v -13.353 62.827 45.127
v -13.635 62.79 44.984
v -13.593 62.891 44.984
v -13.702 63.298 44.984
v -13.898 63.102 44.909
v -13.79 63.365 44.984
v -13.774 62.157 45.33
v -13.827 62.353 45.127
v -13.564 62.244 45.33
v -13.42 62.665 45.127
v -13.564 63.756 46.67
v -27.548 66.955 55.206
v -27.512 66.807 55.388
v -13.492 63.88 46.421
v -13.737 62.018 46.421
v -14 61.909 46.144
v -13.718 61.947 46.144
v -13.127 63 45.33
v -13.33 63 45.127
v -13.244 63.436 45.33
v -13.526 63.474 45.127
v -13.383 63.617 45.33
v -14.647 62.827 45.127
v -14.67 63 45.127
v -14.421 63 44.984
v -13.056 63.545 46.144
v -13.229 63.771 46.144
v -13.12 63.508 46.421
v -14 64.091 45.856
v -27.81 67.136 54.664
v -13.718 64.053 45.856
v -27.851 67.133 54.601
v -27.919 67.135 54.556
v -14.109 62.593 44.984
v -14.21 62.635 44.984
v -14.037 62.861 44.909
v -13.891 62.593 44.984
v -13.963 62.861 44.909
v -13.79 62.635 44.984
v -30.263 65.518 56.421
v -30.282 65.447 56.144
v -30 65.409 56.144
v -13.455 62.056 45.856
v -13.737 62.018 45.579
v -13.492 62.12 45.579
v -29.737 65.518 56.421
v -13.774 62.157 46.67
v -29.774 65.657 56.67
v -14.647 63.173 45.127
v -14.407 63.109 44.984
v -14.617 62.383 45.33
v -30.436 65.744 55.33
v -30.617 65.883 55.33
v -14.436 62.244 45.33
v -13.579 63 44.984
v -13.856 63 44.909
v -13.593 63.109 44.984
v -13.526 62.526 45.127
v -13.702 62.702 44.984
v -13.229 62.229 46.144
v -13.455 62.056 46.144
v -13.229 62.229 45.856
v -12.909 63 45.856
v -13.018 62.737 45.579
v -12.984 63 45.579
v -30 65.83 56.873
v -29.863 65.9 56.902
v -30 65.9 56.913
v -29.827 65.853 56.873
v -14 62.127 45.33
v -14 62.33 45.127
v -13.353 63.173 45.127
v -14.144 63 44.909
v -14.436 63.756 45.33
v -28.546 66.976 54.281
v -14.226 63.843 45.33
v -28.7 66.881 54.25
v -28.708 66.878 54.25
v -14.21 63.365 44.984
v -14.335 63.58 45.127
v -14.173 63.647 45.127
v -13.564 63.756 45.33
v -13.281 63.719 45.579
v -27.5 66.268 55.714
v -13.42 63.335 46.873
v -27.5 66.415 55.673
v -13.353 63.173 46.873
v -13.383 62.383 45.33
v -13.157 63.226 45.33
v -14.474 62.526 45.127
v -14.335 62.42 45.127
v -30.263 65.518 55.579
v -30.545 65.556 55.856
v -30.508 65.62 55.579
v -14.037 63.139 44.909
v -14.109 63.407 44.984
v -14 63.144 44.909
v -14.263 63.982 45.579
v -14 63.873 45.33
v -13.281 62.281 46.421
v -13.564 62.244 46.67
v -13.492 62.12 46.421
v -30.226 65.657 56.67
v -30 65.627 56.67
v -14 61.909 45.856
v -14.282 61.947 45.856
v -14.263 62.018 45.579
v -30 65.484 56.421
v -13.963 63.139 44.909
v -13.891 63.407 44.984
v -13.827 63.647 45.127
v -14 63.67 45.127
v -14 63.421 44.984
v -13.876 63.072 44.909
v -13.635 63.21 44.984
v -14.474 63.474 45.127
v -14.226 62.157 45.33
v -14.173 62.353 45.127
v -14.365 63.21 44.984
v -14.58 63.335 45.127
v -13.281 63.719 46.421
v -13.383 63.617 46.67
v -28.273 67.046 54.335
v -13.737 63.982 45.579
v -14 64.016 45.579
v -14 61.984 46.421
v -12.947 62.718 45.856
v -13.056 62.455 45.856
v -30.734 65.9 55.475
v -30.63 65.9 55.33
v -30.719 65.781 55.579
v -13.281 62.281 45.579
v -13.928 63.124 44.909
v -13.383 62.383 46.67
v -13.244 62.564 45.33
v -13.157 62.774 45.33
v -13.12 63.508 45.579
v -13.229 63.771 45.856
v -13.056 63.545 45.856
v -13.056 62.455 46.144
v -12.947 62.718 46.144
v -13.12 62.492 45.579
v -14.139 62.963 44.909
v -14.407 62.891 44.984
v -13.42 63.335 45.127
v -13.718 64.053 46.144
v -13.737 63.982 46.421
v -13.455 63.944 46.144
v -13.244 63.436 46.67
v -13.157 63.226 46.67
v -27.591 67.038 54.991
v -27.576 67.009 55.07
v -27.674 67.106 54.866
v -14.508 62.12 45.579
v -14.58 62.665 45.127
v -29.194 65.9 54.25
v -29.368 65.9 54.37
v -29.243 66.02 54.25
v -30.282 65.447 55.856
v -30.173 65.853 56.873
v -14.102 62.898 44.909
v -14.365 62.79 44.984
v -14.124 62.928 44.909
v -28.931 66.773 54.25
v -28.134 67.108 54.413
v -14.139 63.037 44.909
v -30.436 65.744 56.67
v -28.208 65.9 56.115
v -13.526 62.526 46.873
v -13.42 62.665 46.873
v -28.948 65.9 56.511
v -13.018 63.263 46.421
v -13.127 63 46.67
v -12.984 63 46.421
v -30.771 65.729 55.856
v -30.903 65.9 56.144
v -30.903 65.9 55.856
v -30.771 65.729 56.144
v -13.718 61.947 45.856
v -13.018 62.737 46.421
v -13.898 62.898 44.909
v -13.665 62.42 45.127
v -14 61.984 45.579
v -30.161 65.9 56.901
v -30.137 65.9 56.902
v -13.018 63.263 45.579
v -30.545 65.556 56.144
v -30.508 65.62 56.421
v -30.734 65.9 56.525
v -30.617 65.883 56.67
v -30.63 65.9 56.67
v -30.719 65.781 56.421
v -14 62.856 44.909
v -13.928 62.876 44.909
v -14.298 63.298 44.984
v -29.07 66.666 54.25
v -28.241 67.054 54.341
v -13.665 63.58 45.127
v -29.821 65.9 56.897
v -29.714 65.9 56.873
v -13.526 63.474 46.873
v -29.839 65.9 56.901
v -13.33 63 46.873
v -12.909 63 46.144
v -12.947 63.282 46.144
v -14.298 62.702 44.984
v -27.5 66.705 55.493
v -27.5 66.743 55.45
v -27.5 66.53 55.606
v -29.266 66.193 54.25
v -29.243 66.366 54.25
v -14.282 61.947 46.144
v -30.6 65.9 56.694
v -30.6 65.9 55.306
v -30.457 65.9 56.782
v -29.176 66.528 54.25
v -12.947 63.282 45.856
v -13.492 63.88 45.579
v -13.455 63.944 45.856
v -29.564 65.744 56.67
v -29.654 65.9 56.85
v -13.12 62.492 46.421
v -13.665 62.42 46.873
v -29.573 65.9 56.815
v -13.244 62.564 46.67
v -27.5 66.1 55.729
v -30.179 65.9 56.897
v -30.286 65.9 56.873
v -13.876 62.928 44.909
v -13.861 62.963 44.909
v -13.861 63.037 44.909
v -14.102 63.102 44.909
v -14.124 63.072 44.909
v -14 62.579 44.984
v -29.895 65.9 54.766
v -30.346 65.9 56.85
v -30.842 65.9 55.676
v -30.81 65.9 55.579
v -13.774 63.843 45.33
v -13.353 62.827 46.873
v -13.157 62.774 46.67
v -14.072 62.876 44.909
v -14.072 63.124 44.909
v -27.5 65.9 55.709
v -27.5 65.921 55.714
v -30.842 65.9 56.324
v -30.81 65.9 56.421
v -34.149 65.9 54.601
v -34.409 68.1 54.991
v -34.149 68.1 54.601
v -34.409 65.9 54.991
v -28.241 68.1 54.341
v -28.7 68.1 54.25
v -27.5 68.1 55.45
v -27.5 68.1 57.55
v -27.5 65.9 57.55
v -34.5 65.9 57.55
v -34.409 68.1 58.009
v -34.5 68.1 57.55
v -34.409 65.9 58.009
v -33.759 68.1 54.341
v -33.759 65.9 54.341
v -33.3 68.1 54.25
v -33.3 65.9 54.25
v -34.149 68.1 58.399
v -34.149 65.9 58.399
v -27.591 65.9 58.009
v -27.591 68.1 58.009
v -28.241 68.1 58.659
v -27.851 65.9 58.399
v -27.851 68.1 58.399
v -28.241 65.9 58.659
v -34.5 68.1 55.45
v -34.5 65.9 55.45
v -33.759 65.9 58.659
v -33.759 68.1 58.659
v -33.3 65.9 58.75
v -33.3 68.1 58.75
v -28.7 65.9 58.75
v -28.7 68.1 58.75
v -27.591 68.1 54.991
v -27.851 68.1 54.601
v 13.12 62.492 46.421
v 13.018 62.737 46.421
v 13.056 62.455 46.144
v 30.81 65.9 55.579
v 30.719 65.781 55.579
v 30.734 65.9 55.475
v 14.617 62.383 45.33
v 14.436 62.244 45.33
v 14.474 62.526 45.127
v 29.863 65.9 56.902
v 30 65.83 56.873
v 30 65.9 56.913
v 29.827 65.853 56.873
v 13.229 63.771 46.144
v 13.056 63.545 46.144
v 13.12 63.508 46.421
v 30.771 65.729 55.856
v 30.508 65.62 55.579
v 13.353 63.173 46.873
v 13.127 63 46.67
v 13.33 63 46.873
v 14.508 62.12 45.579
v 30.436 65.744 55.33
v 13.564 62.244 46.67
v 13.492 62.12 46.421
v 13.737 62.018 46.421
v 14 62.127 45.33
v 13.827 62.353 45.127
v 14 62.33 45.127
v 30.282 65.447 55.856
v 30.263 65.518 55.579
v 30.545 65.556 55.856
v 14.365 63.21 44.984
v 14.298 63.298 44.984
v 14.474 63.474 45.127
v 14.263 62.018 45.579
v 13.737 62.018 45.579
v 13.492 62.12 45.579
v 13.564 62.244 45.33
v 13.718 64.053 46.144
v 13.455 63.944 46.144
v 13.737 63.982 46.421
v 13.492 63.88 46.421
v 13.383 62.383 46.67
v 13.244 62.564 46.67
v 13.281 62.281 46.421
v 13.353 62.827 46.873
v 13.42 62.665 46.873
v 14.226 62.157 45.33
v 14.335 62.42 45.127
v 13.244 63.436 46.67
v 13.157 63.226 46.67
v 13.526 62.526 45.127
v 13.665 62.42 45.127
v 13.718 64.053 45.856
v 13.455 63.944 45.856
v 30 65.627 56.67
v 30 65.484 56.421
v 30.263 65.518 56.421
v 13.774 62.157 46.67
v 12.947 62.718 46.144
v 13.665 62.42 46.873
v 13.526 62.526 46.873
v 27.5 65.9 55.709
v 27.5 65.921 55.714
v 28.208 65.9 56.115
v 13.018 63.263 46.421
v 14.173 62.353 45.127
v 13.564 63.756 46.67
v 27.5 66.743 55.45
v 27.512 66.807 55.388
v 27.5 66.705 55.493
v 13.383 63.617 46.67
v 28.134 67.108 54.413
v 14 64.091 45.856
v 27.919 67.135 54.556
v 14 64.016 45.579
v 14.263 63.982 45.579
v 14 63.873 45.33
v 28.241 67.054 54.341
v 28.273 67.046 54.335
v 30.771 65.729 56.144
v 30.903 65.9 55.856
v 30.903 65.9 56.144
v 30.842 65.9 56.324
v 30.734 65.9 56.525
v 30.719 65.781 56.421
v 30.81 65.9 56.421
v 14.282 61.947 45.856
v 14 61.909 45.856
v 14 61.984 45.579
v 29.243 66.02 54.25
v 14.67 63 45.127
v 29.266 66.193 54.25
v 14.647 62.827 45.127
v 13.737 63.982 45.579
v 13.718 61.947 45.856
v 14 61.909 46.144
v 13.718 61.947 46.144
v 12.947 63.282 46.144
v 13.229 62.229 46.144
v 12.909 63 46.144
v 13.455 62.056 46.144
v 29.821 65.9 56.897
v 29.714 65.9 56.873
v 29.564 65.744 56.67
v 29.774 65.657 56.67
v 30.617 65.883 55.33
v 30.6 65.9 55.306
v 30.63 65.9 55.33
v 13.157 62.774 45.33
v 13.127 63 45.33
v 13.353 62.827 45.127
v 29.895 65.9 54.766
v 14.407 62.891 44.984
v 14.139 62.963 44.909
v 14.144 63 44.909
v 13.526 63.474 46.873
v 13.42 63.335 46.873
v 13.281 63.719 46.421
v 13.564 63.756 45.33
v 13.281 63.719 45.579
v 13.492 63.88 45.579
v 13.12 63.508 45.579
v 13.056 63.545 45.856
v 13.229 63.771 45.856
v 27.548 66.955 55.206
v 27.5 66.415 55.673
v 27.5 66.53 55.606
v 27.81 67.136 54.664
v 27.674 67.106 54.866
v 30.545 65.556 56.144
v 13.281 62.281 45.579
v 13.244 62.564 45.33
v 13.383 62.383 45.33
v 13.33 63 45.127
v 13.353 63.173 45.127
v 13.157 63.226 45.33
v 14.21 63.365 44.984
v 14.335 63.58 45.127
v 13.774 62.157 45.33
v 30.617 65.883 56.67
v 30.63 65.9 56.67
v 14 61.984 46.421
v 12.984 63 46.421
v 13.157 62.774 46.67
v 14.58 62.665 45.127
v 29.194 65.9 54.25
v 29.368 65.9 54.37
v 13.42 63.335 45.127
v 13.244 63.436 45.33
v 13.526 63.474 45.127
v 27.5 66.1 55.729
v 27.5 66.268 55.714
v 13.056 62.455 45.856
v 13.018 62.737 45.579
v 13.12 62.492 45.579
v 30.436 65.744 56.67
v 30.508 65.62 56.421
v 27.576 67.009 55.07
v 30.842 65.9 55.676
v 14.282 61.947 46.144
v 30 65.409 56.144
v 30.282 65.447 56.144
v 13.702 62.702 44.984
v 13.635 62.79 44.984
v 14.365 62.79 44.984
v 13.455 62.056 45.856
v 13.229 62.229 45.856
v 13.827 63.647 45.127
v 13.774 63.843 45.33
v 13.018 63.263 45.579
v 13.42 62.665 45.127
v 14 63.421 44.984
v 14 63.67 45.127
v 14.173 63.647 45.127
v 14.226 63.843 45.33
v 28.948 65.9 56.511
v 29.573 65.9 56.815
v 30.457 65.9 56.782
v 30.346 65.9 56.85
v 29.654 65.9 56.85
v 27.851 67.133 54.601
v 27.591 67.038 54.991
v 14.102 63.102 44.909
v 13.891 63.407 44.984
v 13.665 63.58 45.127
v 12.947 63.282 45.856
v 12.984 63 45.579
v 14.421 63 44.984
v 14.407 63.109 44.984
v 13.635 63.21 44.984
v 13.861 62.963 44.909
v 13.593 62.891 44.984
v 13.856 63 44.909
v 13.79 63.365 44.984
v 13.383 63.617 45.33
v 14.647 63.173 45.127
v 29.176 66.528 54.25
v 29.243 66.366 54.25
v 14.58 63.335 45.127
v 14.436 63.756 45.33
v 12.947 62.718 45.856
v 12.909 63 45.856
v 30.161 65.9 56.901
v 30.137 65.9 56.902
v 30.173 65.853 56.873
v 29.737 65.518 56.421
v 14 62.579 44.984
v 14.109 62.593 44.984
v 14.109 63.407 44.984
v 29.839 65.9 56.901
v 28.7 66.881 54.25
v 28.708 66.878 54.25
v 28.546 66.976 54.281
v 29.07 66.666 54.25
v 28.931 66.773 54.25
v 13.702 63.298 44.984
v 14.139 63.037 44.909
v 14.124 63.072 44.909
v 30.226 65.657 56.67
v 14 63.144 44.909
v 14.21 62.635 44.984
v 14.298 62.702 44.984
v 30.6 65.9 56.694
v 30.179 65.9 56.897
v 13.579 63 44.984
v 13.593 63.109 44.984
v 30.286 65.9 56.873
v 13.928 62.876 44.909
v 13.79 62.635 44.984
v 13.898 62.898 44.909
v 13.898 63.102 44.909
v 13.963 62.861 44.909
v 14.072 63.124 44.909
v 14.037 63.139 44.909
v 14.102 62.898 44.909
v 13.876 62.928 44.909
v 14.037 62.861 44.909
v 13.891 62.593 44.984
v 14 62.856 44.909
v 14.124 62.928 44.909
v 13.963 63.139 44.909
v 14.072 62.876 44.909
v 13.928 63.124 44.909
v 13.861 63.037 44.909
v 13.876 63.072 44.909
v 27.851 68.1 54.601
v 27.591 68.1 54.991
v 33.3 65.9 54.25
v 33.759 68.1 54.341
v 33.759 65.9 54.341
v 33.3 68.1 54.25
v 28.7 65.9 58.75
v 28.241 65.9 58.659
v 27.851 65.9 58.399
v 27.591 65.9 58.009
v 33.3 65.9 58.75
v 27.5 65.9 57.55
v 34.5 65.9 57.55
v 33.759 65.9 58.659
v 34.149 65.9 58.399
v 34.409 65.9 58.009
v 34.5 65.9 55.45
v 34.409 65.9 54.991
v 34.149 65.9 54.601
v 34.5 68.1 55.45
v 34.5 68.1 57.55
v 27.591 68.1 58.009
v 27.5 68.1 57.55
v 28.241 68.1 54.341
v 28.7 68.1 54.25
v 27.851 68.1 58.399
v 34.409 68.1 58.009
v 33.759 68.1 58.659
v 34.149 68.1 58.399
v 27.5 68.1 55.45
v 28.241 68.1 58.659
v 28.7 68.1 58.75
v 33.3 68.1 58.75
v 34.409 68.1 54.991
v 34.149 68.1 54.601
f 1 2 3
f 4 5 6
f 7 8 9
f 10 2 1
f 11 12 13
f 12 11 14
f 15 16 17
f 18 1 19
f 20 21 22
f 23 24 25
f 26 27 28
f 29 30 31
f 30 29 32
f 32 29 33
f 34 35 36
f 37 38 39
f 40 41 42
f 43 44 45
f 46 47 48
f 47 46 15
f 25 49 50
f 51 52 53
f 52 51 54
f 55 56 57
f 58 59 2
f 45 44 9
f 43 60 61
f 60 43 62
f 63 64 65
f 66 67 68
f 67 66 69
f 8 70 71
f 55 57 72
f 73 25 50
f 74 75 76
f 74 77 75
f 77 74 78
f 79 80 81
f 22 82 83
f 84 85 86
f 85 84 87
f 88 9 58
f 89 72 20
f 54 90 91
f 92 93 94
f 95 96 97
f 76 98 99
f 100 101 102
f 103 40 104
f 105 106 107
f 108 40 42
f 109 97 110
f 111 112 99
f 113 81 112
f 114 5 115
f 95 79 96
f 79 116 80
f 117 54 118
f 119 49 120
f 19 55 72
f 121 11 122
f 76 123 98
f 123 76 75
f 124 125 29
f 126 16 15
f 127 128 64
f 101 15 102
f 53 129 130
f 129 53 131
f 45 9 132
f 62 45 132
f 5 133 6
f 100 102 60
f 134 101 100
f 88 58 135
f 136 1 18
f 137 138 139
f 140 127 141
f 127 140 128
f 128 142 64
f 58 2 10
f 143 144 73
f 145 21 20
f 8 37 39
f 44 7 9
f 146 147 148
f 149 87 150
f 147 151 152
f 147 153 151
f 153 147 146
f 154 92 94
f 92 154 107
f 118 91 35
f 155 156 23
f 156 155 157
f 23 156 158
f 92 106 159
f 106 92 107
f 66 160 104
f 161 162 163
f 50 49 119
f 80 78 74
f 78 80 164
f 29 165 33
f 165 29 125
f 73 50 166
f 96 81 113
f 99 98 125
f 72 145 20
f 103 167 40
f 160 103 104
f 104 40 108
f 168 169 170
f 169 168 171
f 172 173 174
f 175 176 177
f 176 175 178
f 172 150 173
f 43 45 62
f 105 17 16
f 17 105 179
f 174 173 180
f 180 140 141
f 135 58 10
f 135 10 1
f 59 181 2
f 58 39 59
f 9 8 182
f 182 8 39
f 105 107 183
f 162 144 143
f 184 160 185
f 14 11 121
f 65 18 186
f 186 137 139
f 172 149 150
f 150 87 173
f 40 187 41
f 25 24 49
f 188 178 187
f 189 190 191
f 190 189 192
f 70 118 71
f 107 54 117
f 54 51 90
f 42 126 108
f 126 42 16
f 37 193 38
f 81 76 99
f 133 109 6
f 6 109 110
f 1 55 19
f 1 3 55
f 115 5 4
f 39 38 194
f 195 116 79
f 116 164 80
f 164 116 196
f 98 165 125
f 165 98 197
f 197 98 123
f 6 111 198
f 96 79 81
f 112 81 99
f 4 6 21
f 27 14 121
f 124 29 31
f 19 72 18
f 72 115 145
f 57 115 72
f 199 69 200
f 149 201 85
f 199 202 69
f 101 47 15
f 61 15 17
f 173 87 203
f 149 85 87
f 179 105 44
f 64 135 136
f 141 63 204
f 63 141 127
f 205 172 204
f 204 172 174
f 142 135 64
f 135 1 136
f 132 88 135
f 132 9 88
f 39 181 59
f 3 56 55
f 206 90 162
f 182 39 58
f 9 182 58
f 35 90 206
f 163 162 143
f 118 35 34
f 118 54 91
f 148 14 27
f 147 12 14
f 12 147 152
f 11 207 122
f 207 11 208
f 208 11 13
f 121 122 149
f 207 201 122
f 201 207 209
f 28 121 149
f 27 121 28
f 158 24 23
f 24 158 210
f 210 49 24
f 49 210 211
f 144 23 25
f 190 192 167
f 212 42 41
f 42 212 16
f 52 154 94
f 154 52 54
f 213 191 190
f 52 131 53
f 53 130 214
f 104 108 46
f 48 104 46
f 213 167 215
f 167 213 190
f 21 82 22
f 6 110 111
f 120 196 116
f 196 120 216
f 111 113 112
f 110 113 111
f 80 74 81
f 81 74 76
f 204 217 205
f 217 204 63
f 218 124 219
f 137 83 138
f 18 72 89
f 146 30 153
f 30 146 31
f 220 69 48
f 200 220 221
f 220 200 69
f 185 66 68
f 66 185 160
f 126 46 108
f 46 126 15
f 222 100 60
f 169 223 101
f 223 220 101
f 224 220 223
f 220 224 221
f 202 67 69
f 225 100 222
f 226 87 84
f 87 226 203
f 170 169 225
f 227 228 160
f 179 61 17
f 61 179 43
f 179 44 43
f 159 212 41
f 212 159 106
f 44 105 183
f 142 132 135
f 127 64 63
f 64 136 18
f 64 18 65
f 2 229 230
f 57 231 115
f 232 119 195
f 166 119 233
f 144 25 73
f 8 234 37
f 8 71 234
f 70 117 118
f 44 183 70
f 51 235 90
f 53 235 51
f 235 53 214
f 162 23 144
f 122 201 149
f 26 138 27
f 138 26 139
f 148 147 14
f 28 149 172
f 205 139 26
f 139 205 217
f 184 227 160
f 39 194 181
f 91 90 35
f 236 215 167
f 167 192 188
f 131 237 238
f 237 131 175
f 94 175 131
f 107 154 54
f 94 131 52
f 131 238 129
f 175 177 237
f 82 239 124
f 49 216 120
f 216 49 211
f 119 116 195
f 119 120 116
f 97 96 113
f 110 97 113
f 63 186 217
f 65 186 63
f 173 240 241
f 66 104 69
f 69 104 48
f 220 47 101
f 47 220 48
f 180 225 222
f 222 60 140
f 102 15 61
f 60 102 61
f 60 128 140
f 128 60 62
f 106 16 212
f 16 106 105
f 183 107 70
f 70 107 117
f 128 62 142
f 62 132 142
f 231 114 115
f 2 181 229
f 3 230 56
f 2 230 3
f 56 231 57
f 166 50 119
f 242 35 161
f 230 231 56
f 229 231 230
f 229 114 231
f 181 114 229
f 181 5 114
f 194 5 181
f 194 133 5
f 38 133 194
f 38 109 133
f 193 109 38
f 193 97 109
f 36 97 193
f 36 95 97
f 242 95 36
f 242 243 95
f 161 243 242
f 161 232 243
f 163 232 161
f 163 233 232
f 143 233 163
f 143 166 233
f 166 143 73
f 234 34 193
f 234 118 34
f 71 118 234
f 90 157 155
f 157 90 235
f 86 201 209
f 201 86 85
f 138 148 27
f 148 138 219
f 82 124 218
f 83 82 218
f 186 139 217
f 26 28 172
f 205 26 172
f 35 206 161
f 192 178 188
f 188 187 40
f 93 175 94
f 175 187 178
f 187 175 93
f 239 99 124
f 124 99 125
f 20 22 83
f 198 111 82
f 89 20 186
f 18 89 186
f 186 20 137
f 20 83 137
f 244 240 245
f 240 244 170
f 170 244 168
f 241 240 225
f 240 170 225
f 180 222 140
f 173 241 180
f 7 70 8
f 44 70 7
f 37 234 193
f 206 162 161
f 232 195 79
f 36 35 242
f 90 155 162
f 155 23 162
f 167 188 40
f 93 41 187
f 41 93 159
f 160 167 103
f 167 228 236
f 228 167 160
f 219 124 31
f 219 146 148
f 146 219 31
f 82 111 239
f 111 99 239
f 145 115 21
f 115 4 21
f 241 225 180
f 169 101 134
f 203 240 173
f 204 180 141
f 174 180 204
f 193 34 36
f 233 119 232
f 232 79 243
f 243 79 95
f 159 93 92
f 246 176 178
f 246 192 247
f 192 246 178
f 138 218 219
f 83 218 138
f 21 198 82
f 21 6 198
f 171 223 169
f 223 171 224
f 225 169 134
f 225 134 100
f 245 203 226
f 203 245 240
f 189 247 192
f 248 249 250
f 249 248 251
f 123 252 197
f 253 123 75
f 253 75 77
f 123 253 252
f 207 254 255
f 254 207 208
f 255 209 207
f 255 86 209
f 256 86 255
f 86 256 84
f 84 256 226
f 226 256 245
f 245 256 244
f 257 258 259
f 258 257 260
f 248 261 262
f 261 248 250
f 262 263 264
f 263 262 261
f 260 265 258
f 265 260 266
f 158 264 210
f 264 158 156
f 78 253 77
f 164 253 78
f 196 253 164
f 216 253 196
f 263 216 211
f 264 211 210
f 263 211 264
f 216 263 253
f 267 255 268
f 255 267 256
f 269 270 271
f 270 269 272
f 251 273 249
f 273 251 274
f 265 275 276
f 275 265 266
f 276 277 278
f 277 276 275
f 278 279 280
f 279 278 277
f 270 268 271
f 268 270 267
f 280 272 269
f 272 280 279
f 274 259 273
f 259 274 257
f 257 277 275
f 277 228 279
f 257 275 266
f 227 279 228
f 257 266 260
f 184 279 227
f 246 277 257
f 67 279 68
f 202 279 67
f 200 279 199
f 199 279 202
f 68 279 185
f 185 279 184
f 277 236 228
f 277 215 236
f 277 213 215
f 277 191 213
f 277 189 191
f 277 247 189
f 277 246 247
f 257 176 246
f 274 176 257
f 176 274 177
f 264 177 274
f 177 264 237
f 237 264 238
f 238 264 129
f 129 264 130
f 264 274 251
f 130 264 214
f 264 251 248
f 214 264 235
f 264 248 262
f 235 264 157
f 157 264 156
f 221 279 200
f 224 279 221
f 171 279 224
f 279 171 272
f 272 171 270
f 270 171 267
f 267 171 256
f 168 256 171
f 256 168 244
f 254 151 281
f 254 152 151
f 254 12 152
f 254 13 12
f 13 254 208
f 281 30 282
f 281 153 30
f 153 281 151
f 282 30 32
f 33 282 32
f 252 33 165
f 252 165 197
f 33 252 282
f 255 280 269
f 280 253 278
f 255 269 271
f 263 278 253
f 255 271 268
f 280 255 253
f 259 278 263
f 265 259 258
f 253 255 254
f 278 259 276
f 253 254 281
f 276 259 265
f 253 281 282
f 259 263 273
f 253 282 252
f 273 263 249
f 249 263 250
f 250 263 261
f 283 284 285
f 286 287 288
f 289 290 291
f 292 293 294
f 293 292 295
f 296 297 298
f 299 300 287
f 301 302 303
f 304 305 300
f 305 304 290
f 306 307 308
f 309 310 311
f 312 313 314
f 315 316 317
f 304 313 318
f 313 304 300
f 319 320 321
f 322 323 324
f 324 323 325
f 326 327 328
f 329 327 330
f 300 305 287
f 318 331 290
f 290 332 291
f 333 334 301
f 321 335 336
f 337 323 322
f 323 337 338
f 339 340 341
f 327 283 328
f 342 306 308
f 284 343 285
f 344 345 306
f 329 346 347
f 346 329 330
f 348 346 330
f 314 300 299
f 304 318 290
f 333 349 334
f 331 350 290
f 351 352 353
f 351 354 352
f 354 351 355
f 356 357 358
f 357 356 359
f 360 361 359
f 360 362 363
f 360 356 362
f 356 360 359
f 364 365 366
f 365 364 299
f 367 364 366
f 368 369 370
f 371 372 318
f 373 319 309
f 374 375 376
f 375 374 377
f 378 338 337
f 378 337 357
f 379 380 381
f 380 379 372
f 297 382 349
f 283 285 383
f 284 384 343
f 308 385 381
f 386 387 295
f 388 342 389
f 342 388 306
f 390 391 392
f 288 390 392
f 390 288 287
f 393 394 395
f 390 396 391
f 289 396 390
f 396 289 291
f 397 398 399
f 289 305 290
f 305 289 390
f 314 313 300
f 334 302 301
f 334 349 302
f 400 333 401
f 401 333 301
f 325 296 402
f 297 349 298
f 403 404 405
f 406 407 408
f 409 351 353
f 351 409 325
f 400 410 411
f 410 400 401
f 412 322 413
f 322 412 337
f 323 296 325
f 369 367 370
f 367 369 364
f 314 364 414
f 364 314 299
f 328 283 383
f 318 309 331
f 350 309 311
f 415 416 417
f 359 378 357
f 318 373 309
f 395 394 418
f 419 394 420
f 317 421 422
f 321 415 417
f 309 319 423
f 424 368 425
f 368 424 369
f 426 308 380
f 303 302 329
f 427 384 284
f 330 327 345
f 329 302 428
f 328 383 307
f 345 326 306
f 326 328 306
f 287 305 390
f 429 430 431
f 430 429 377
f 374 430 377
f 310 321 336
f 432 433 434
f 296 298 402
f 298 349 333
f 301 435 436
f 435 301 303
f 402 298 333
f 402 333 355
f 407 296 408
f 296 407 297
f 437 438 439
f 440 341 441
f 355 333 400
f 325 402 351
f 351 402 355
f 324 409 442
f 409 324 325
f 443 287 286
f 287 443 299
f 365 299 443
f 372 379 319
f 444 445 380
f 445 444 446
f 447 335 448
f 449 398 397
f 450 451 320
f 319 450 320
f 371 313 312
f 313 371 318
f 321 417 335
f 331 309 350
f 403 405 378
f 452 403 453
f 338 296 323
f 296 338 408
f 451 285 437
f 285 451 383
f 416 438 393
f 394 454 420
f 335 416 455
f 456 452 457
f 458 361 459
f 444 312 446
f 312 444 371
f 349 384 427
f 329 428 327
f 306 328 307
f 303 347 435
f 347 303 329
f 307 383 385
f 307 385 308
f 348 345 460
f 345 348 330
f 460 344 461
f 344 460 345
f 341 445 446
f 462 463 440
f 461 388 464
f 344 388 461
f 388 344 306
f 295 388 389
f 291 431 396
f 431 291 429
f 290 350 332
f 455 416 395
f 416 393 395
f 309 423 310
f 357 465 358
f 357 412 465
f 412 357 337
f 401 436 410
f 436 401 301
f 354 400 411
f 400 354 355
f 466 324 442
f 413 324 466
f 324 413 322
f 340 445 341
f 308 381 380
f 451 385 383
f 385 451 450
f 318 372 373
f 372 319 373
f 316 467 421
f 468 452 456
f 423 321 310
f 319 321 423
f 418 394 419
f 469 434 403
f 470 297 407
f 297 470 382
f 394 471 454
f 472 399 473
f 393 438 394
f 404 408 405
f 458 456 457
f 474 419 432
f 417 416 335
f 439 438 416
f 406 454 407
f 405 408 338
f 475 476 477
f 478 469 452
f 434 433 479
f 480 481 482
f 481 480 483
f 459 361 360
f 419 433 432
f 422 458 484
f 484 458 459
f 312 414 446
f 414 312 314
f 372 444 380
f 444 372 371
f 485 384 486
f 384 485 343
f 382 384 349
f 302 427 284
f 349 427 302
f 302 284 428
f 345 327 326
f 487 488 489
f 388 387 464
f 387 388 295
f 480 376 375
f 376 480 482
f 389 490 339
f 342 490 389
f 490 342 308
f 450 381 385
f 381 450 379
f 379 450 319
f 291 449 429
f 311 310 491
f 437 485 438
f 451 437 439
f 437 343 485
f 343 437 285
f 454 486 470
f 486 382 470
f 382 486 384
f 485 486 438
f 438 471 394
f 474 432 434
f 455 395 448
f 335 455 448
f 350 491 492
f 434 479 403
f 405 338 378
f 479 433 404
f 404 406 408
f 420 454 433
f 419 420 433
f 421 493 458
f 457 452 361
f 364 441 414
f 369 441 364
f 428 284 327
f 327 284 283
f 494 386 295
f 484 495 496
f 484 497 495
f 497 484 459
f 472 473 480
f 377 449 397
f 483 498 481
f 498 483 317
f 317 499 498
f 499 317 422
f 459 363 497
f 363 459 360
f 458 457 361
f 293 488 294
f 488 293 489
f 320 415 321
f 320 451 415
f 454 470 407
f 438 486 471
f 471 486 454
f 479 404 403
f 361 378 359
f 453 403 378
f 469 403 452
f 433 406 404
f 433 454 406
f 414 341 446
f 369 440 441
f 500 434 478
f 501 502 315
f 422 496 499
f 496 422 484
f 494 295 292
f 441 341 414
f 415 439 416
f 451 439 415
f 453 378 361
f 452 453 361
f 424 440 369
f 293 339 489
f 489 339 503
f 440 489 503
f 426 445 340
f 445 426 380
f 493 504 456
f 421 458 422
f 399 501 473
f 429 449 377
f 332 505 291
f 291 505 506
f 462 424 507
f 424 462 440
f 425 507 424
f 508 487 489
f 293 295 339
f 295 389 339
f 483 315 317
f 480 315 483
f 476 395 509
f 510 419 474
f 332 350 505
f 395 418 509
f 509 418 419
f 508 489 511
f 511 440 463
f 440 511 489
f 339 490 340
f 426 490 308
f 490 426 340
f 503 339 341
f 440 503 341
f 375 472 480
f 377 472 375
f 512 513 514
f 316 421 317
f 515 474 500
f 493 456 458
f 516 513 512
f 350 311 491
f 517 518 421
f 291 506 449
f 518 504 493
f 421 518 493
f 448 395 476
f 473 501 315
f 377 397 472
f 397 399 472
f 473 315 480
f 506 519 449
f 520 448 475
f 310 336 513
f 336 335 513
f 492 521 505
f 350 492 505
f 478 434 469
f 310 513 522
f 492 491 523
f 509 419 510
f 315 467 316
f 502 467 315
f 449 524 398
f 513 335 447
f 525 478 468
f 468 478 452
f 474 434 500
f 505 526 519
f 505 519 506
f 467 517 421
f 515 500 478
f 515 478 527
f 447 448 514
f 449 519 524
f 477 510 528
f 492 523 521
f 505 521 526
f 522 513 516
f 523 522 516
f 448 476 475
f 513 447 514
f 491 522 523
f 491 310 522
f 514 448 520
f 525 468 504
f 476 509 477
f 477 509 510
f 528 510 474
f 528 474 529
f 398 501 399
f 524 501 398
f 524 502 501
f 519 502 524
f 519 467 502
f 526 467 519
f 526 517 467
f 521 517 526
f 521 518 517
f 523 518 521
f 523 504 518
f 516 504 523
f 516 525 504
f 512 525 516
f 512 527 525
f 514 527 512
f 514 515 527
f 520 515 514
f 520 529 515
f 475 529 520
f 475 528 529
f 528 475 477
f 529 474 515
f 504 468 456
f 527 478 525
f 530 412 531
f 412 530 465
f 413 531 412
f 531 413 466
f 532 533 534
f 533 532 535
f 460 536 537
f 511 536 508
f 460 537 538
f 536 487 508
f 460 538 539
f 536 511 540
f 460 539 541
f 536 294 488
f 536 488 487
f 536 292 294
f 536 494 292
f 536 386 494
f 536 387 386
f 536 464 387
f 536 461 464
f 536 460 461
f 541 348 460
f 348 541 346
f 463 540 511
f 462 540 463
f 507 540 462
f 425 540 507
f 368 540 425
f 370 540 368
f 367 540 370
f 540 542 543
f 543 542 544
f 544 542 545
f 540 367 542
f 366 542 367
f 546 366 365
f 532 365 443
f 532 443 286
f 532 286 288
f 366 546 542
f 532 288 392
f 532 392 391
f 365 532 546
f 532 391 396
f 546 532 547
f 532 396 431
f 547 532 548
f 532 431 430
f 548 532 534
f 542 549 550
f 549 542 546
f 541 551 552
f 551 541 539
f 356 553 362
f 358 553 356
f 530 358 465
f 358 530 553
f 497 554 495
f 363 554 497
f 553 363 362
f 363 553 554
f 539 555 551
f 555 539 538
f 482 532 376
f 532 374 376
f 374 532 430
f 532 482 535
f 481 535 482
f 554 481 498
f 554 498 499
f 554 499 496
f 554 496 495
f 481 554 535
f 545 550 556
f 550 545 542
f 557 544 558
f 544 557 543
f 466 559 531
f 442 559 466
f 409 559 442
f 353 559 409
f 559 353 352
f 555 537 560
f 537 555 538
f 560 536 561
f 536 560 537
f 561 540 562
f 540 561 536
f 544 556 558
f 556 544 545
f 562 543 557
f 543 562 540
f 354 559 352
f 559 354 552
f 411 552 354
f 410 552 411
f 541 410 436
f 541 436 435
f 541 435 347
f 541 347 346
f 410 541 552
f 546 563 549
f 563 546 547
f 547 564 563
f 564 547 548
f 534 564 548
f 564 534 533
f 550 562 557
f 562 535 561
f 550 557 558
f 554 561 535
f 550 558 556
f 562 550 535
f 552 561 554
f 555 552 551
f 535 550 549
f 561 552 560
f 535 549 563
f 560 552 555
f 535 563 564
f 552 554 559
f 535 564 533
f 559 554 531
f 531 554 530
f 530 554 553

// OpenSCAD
// file: ../lib.scad
// ===== 공용 프리미티브 (params 의존 없음 — use로 포함. 함정 1) =====

// 두 점을 잇는 캡슐. 끝단이 od/2 만큼 뻗는다 (함정 3)
module rod(p1, p2, od, fn = 56)
    hull() { translate(p1) sphere(d = od, $fn = fn);
             translate(p2) sphere(d = od, $fn = fn); }

function mir(p, s = 1) = [s * p.x, p.y, p.z];

// --- 라운디드 사각 2D 폴리곤 (CCW) ---
function arc_pt(cx, cy, r, a) = [cx + r * cos(a), cy + r * sin(a)];
function rrpts(w, h, r, n = 4) =
    let (x = w / 2 - r, y = h / 2 - r)
    concat(
        [for (i = [0:n]) arc_pt( x, -y, r, -90 + 90 * i / n)],
        [for (i = [0:n]) arc_pt( x,  y, r,   0 + 90 * i / n)],
        [for (i = [0:n]) arc_pt(-x,  y, r,  90 + 90 * i / n)],
        [for (i = [0:n]) arc_pt(-x, -y, r, 180 + 90 * i / n)]);

// y 위치의 XZ 단면 슬래브 (중심 x0/zc, 폭 w/높이 h, 모서리 r).
// 회전 매핑: 2D x→차량 X, 2D y→차량 Z, 돌출 +z→−Y (y..y+0.02 전방 전용, 함정 20)
module slabr(y, x0, w, h, zc, r)
    translate([x0, y + 0.02, zc]) rotate([90, 0, 0])
        linear_extrude(0.02) polygon(rrpts(w, h, r));

// 단면 체인 loft: sec = [[y, x0, w, h, zc, r], ...]
module loftr(sec)
    for (i = [0 : len(sec) - 2])
        hull() {
            slabr(sec[i][0],     sec[i][1],     sec[i][2],     sec[i][3],     sec[i][4],     sec[i][5]);
            slabr(sec[i + 1][0], sec[i + 1][1], sec[i + 1][2], sec[i + 1][3], sec[i + 1][4], sec[i + 1][5]);
        }

// 라운디드 박스 (z0..z1 수직, 평면 모서리 r)
module rbox(xc, yc, z0, z1, dx, dy, r, fn = 32)
    hull() for (px = [-1, 1], py = [-1, 1])
        translate([xc + px * (dx / 2 - r), yc + py * (dy / 2 - r), z0])
            cylinder(r = r, h = z1 - z0, $fn = fn);

// --- NACA 계열 에어포일 (LE 원점, 2D +x = 현 방향) ---
function _yt(x, c, t) = 5 * t * c * (0.2969*sqrt(x) - 0.1260*x - 0.3516*x*x
    + 0.2843*x*x*x - 0.1036*x*x*x*x);
function _yc(x, c, m) = 4 * m * c * x * (1 - x);
function naca_pts(c, t, m, n = 12) =
    concat(
        [for (i = [0:n])     let (x = i / n)     [x*c,  _yt(x, c, t) + _yc(x, c, m)]],
        [for (i = [n-1:-1:0]) let (x = i / n)    [x*c, -_yt(x, c, t) + _yc(x, c, m)]]);

// 슬라이스 3D 링: v=[x, yle, zle, c, aoa, th, cam] → 받각 회전된 naca 점의 링
// (th/cam은 mm — 현 대비 비율로 정규화)
function wring(v, n = 12) =
    let (c = v[3], t = v[5] / c, m = v[6] / c, pts = naca_pts(c, t, m, n),
         ca = cos(v[4]), sa = sin(v[4]))
    // 코드 방향 (ca,sa) + 두께/캠버 수직 방향 (-sa,ca) — 2D y 누락 금지
    [for (p = pts) [v[0], v[1] + p[0] * ca - p[1] * sa, v[2] + p[0] * sa + p[1] * ca]];

// 진짜 로프트 윙 — polyhedron 스트립. hull 체인은 캠버진 하면을 볼록 껍질로
// 채워(LE→TE 직선 웨지) 요소가 처지므로 쓰지 않는다
module wing3(sl, n = 12) {
    rings = [for (v = sl) wring(v, n)];
    ns = len(rings);
    m = len(rings[0]);
    pts = [for (r = rings, p = r) p];
    function ix(i, k) = i * m + (k % m);
    faces = concat(
        // 측면 스트립 (사중면 → 삼각형 2) — 외향 노멀 권선(캡과 일치)
        [for (i = [0 : ns - 2], k = [0 : m - 1])
            each [[ix(i, k), ix(i, k + 1), ix(i + 1, k + 1)],
                  [ix(i, k), ix(i + 1, k + 1), ix(i + 1, k)]]],
        // 끝 캡 (링은 단순 폴리곤 — 팬 삼각분할)
        [for (k = [1 : m - 2]) [ix(0, 0), ix(0, k + 1), ix(0, k)]],
        [for (k = [1 : m - 2]) [ix(ns - 1, 0), ix(ns - 1, k), ix(ns - 1, k + 1)]]
    );
    polyhedron(points = pts, faces = faces, convexity = 4);
}

// 반쪽 슬라이스 → x-대칭 전체. 규약: half는 센터(x=0)→팁 순서(내림차순 x).
// 결과는 x 오름차순 체인. x=0 센터만 중복 제외 (그 외 전부 미러)
function wsym(half) =
    concat([for (i = [len(half) - 1 : -1 : 0]) half[i]],
           [for (i = [0 : len(half) - 1]) if (abs(half[i][0]) > 1e-9)
               concat([-half[i][0]], [for (j = [1 : len(half[i]) - 1]) half[i][j]])]);

// 환(링), 축 Z
module ann(r_in, r_out, h, fn = 96)
    difference() { cylinder(r = r_out, h = h, center = true, $fn = fn);
                   cylinder(r = r_in,  h = h + 2, center = true, $fn = fn); }

// 리스트 전체 x반전+순서 역행 (센터 구간 없는 플랩 등 — 좌우 별도 wing3 호출용).
// x반전만 하면 행렬식이 음수가 되어 권선이 뒤집힌다 → 순서 역행으로 상쇄
function msym(half) =
    [for (i = [len(half) - 1 : -1 : 0])
        concat([-half[i][0]], [for (j = [1 : len(half[i]) - 1]) half[i][j]])];
// file: ../params.scad
// =====================================================================
// F1 그랜드파이언스 카 1:10 — 전체 파라미터 (유일한 수정 지점)
// 좌표계: +Y 전방, +X 좌측, +Z 상방, 지면 z=0, 원점=휠베이스 중심
// 전장 558 (y -268..+278), 전폭 194, 휠베이스 360, 타이어 OD 72 (720mm)
// 30부품. loftr 단면 = [y, x0, w, h, zc, r] (XZ 단면, y..y+0.02 슬래브)
// wing3 슬라이스 = [x, yle, zle, c, aoa, th, cam]
//   aoa: 현 방향의 X축 회전각. 전방 받각 요소는 165~170 (TE가 뒤+위)
// =====================================================================
$fn = 96;

// -- 휠/액슬 (실차 720mm 타이어, 18인치 림, 트랙 F1600/R1550) --
AXF_Y = 180;   AXR_Y = -180;
WHF_X = 80;    WHR_X = 77.5;
WH_Z  = 36;
TIRF_W = 30.5; TIRR_W = 40.5;  TIR_R = 36;
TIR_FN = 288;                 // 타이어 회전체 해상도
RIM_R = 23.2;  RIM_T = 1.0;   // 림 배럴 반경/두께
RIM_LF = 12.4; RIM_LR = 17.4; // 림 배럴 반폭
HUB_BORE = 7.0; STUB_D = 6.2; // 방사 간극 0.4
DISC_R = 15.5;                // 브레이크 디스크

// -- 바디 공통 레벨 --
FLO_Z0 = 2.0;  FLO_Z1 = 5.5;  // 플로어 (두께 3.5)
BOD_Z0 = 5.65;                // 샤시/카버/기어박스 바닥 (플로어 위 0.15)
J = 0.15;                     // 부품 접합 기본 간극
ARM_OD = 3.4;                 // 서스펜션 암 캡슐 직경

// ===== 01 플로어 =====
FLOOR_SEC = [
    [132,    0,  92, 3.5, 3.75, 1.5], [100, 0, 118, 3.5, 3.75, 1.5],
    [60,     0, 130, 3.5, 3.75, 2.0], [10,  0, 132, 3.5, 3.75, 2.0],
    [-60,    0, 128, 3.5, 3.75, 2.0], [-120, 0, 112, 3.5, 3.75, 2.0],
    [-161.85, 0, 100, 3.5, 3.75, 2.0]];

// ===== 02 디퓨저 (램프 + 스트레이크는 부품 내부) =====
DIFF_SEC = [
    [-230,   0, 100, 10.0, 11.0, 1.5], [-215, 0, 100, 8.0,  9.0, 1.5],
    [-190,   0, 100,  6.0,  6.2, 1.5], [-162.0, 0, 100, 4.0, 4.15, 1.5]];
DIFF_TOP = [[-175, 7.8], [-205, 11.9], [-228, 15.6]];  // (y, 램프 상면 z)

// ===== 03 플로어 에지 윙 =====
FEW_SEC = [   // [y, x0, w, h, zc, r] — x0 부호로 좌우
    [55,   63.5, 3.0, 2.0, 6.65, 1.0], [-5,  65.5, 3.0, 5.5, 8.40, 1.5],
    [-70,  63.0, 3.0, 4.0, 7.65, 1.5], [-120, 58.0, 3.0, 3.0, 7.15, 1.5]];
FEW2_SEC = [
    [100, 57.0, 2.5, 1.5, 6.40, 0.8], [60, 60.0, 2.5, 2.0, 6.65, 0.8]];

// ===== 04 노우즈 =====
NOSE_SEC = [
    [95,   0, 38, 28, 25.3, 12], [100,  0, 38, 29, 25.3, 12],
    [115,  0, 36, 28, 23.8, 11], [135,  0, 31, 24, 21.3,  9],
    [160,  0, 27, 20, 18.3,  8], [185,  0, 23, 17, 15.8,  7],
    [205,  0, 20, 15, 14.3,  6], [224,  0, 17, 12, 12.3,  5],
    [242,  0, 14,  9, 10.8,  4], [258,  0, 10,  7, 10.1,  3],
    [272,  0,  4.5, 4.5, 9.8, 2], [273.5, 0, 1.2, 1.2, 9.8, 0.6]];

// ===== 05 샤시(모노코크) + 콕핏 컷 =====
CHAS_SEC = [
    [-34.85, 0, 46, 44, 27.65, 15], [-10, 0, 48, 46, 28.65, 15],
    [20,     0, 48, 44, 27.65, 15], [60,  0, 46, 40, 25.65, 14],
    [94.85,  0, 42, 34, 22.65, 12]];
CKP_CUT = [[62, 0, 34, 32, 46, 3], [-30, 0, 34, 30, 45, 3]];

// ===== 06 엔진 커버 + 샤크핀 =====
COV_SEC = [
    [-152,   0,  8, 14, 35.65,  6], [-140, 0, 12, 18, 32.65,  7],
    [-120,   0, 18, 24, 29.65,  9], [-95,  0, 26, 30, 26.15, 11],
    [-70,    0, 34, 36, 25.65, 13], [-50,  0, 40, 40, 25.65, 14],
    [-35.15, 0, 44, 42, 26.65, 15]];
FIN_SEC = [
    [-162, 0, 2.2, 44, 62.0, 1], [-120, 0, 2.5, 30, 56.0, 1],
    [-92.2, 0, 2.5, 10, 45.0, 1]];

// ===== 07 에어박스 (험프 + 인테이크 링) =====
ABX_SEC = [
    [-92, 0, 14, 17, 50.00, 6], [-68, 0, 20, 24, 56.60, 8],
    [-46, 0, 22, 26, 59.60, 8], [-34, 0, 22, 13, 56.30, 6]];
ABX_RING_C = [0, -45, 73.5];  ABX_RING_R = 11;  ABX_RING_T = 4.5;
ABX_RING_SZ = 0.72;

// ===== 08 사이드포드 (x0=±41.5) =====
SPOD_X0 = 41.5;
SPOD_SEC = [   // [y, w, h, zc, r]
    [38,   34, 26, 18.65, 8], [5,   34, 28, 19.65, 9], [-25,  34, 26, 18.65, 9],
    [-55,  32, 21, 18.15, 8], [-80, 30, 15, 17.15, 8], [-100, 26,  9, 16.15, 7]];
SPOD_INLET = [24, 18, 19, 2.3];  // 컷: w, h, zc, 깊이

// ===== 09 할로 =====
HALO_N = 28;  HALO_OD = 9;
HALO_RX = 22; HALO_RY = 44; HALO_CY = 12;  // 타원 계획면(평면도)
HALO_Z0 = 75; HALO_ZA = 2;                 // z(t) = Z0 + ZA*cos(t)

// ===== 10/11/12/13 프런트 윙 =====
FW_MAIN_HALF = [   // 반쪽(x≤0) — wsym()로 전체화
    [0,    258.3, 2.4, 20, 170, 1.4, 2.0],
    [-16,  259.0, 3.4, 27, 165, 1.6, 2.4],
    [-40,  260.0, 3.6, 40, 166, 1.8, 2.8],
    [-60,  257.0, 4.0, 37, 167, 1.7, 2.6],
    [-80,  258.0, 4.4, 31, 166, 1.6, 2.2],
    [-95.2, 263.0, 4.6, 26, 166, 1.5, 1.8]];
FW_F1_HALF = [
    [-16,  253.0, 8.0, 22, 155, 1.3, 4.0],
    [-40,  250.5, 8.2, 26, 156, 1.4, 4.2],
    [-60,  249.5, 8.4, 26, 157, 1.4, 4.2],
    [-80,  250.0, 8.6, 24, 158, 1.4, 4.0],
    [-95.2, 254.0, 8.8, 21, 158, 1.3, 3.5]];
FW_F2_HALF = [
    [-16,  258.0, 12.4, 17, 147, 1.2, 4.5],
    [-40,  255.5, 12.6, 20, 148, 1.3, 4.8],
    [-60,  254.5, 12.8, 20, 149, 1.3, 4.8],
    [-80,  254.5, 13.0, 19, 150, 1.3, 4.5],
    [-95.2, 258.0, 13.2, 17, 150, 1.2, 4.0]];
FW_EP_X = 96.3;  FW_EP_T = 1.5;   // 엔드플레이트 x 중심/두께
FW_EP_PTS = [    // (y,z) 아웃라인
    [226, 1.5], [266, 1.5], [266, 8], [263, 24.5], [252, 24.5],
    [244, 17], [233, 15], [226, 9]];
FW_MT_SEC = [   // 마운트 플레이트 [y, x0(±2.6), w, h, zc, r] — 노우즈 저면 라운딩 회피
    [244, 2.6, 1.6, 1.8, 5.25, 0.5], [250, 2.6, 1.6, 1.8, 5.25, 0.5]];

// ===== 14 리어 윙 =====
RW_MAIN = [
    [-50.8, -212, 57.5, 46, 162, 2.2, -3.5], [-25, -211, 56.6, 47, 162, 2.3, -4.0],
    [0,     -210, 54.2, 47, 162, 2.3, -4.0], [25,  -211, 56.6, 47, 162, 2.3, -4.0],
    [50.8,  -212, 57.5, 46, 162, 2.2, -3.5]];
RW_FLAP = [
    [-49.6, -234,   71.8, 30, 155, 1.8, -4.5],
    [0,     -235.5, 73.0, 30, 155, 1.8, -4.5],
    [49.6,  -234,   71.8, 30, 155, 1.8, -4.5]];
RW_EP_X = 52;  RW_EP_T = 2;
RW_EP_PTS = [
    [-200, 46], [-268, 46], [-268, 60], [-262, 93], [-250, 93],
    [-243, 72], [-218, 64], [-202, 74]];
RW_DRS = [-245, 79.4, 5.0, 2.6, 3.0];   // 팟: y, z, w, h, 두께

// ===== 15 빔 윙 =====
BEAM_E1 = [
    [-50.9, -204.5, 31.5, 16, 162, 1.8, -2.5], [0, -205.5, 30.4, 16, 162, 1.8, -2.5],
    [50.9,  -204.5, 31.5, 16, 162, 1.8, -2.5]];
BEAM_E2 = [
    [-50.9, -210, 36.8, 15, 158, 1.6, -3.0], [0, -211, 35.6, 15, 158, 1.6, -3.0],
    [50.9,  -210, 36.8, 15, 158, 1.6, -3.0]];
BEAM_PLATE = [-214, -200.15, 8.2, 22, 31];  // 마운트 플레이트 y1,y0,x반폭,z0,z1

// ===== 16 리어윙 파일론(쌍둥 스완넥) =====
RW_PYL = [[-158, 55.0], [-190, 58.0], [-212.5, 63.0]];  // (y, z), x=±5.4
RW_PYL_X = 5.4;  RW_PYL_OD = 8;

// ===== 17 미러 =====
MIR_BASE = [14, 63, 46.0];  MIR_HOUSE = [31, 66, 56.5];

// ===== 18 헬멧 =====
HELM_C = [0, 0, 55];  HELM_R = 11.5;
HELM_SC = [1, 1.18, 1.02];

// ===== 19 콕핏 트림 =====
SEAT_SEC  = [[30, 0, 26, 13.2, 36.75, 3], [-10, 0, 26, 13.2, 36.75, 3]];
HREST_SEC = [[12, 0, 32, 15, 53.5, 5], [-20, 0, 32, 15, 53.5, 5]];

// ===== 20 스티어링 휠 =====
SW_C = [0, 40, 47];  SW_TILT = 20;

// ===== 21/22 서스펜션 (픽업=[x, y, z], 암 끝은 업라이트 내부) =====
FUP = [61, 183, 46];  FLO_BALL = [61.5, 181, 24];  FTR = [61.5, 177, 35];
FPU = [61.5, 180, 27];
F_ARM = [   // [픽업, 볼]
    [[12.0, 206, 20.0], FUP],  [[16.0, 152, 23.0], FUP],
    [[11.9, 208,  9.3], FLO_BALL], [[16.3, 150, 12.0], FLO_BALL],
    [[15.6, 162, 14.0], FTR]];
F_PUSH = [[11.8, 198, 24.4], FPU];
RUP = [53.5, -182, 46];  RLO = [54, -179, 23];  RDRIVE_O = [52, -180, 31];
R_ARM = [
    [[13.3, -160, 47.0], RUP], [[13.3, -198, 45.0], RUP],
    [[12.8, -158, 20.4], RLO], [[9.2, -202, 19.6], RLO]];
R_PULL = [[12.6, -177, 23.75], [53.5, -181, 44]];
R_DRIVE = [[13.2, -180, 17.0], RDRIVE_O];

// ===== 23/24 브레이크 스쿱 =====
SCOOP_F = [[164.2, 59.5, 7, 11, 30, 3], [158, 58.5, 5.5, 8, 28.5, 2.5]];
SCOOP_R = [[-164.2, 48, 7, 10, 29, 3], [-158, 46, 5, 7.5, 27.5, 2.5]];

// ===== 25~28 타이어/림 =====
TIRE_BEAD = 2.6;   // 비드 안쪽 세팅 (단면 반경 23.4)

// ===== 29 기어박스 + 리어 크래시 =====
GEAR_SEC = [
    [-258,   0,  4,  1.8, 15.00, 1.5], [-252, 0,  6,  1.6, 16.30, 2],
    [-230,   0,  9,  1.4, 18.30, 3],   [-208, 0, 12,  4.9, 15.05, 4],
    [-195,   0, 16,  9.35, 14.83, 5],   [-170, 0, 20, 15.1, 15.45, 6],
    [-145,   0, 22, 15.95, 13.60, 7],  [-117.85, 0, 26, 8.6,  9.95, 8]];
GEAR_TOWER = [-200, -158, 8, 11.3, 28, 50];  // y1,y0,x내측,x외측,z0,z1
RAIN_LT = [-258.6, 5, 4];   // y면, w, h

// ===== 30 카메라/안테나 =====
TCAM_Y = -45;  TCAM_Z0 = 84.8;
SIDECAM = [[194, 19.0], [202, 18.5]];  // (y, z) — x는 노우즈 반폭+0.15
ANT = [[4, 70], [-4, 70]];             // (x, y) — chassis 탑
// main file
// 17 미러 — 스토크 + 하우징 + 글래스 (좌우 1부품)
include <../params.scad>
use <../lib.scad>

module mirror_assembly()
for (s = [-1, 1]) {
    rod(mir(MIR_BASE, s), mir([30, 66.5, 56], s), 2.2, 24);
    translate(mir([31, 68.1, 56.5], s)) rotate([90, 0, 0])
        linear_extrude(2.2) polygon(rrpts(7, 4.5, 1.2));       // 하우징
    translate(mir([31, 67.4, 56.5], s)) rotate([90, 0, 0])
        linear_extrude(0.5) polygon(rrpts(5.5, 3, 0.8));       // 글래스
}

mirror_assembly();
